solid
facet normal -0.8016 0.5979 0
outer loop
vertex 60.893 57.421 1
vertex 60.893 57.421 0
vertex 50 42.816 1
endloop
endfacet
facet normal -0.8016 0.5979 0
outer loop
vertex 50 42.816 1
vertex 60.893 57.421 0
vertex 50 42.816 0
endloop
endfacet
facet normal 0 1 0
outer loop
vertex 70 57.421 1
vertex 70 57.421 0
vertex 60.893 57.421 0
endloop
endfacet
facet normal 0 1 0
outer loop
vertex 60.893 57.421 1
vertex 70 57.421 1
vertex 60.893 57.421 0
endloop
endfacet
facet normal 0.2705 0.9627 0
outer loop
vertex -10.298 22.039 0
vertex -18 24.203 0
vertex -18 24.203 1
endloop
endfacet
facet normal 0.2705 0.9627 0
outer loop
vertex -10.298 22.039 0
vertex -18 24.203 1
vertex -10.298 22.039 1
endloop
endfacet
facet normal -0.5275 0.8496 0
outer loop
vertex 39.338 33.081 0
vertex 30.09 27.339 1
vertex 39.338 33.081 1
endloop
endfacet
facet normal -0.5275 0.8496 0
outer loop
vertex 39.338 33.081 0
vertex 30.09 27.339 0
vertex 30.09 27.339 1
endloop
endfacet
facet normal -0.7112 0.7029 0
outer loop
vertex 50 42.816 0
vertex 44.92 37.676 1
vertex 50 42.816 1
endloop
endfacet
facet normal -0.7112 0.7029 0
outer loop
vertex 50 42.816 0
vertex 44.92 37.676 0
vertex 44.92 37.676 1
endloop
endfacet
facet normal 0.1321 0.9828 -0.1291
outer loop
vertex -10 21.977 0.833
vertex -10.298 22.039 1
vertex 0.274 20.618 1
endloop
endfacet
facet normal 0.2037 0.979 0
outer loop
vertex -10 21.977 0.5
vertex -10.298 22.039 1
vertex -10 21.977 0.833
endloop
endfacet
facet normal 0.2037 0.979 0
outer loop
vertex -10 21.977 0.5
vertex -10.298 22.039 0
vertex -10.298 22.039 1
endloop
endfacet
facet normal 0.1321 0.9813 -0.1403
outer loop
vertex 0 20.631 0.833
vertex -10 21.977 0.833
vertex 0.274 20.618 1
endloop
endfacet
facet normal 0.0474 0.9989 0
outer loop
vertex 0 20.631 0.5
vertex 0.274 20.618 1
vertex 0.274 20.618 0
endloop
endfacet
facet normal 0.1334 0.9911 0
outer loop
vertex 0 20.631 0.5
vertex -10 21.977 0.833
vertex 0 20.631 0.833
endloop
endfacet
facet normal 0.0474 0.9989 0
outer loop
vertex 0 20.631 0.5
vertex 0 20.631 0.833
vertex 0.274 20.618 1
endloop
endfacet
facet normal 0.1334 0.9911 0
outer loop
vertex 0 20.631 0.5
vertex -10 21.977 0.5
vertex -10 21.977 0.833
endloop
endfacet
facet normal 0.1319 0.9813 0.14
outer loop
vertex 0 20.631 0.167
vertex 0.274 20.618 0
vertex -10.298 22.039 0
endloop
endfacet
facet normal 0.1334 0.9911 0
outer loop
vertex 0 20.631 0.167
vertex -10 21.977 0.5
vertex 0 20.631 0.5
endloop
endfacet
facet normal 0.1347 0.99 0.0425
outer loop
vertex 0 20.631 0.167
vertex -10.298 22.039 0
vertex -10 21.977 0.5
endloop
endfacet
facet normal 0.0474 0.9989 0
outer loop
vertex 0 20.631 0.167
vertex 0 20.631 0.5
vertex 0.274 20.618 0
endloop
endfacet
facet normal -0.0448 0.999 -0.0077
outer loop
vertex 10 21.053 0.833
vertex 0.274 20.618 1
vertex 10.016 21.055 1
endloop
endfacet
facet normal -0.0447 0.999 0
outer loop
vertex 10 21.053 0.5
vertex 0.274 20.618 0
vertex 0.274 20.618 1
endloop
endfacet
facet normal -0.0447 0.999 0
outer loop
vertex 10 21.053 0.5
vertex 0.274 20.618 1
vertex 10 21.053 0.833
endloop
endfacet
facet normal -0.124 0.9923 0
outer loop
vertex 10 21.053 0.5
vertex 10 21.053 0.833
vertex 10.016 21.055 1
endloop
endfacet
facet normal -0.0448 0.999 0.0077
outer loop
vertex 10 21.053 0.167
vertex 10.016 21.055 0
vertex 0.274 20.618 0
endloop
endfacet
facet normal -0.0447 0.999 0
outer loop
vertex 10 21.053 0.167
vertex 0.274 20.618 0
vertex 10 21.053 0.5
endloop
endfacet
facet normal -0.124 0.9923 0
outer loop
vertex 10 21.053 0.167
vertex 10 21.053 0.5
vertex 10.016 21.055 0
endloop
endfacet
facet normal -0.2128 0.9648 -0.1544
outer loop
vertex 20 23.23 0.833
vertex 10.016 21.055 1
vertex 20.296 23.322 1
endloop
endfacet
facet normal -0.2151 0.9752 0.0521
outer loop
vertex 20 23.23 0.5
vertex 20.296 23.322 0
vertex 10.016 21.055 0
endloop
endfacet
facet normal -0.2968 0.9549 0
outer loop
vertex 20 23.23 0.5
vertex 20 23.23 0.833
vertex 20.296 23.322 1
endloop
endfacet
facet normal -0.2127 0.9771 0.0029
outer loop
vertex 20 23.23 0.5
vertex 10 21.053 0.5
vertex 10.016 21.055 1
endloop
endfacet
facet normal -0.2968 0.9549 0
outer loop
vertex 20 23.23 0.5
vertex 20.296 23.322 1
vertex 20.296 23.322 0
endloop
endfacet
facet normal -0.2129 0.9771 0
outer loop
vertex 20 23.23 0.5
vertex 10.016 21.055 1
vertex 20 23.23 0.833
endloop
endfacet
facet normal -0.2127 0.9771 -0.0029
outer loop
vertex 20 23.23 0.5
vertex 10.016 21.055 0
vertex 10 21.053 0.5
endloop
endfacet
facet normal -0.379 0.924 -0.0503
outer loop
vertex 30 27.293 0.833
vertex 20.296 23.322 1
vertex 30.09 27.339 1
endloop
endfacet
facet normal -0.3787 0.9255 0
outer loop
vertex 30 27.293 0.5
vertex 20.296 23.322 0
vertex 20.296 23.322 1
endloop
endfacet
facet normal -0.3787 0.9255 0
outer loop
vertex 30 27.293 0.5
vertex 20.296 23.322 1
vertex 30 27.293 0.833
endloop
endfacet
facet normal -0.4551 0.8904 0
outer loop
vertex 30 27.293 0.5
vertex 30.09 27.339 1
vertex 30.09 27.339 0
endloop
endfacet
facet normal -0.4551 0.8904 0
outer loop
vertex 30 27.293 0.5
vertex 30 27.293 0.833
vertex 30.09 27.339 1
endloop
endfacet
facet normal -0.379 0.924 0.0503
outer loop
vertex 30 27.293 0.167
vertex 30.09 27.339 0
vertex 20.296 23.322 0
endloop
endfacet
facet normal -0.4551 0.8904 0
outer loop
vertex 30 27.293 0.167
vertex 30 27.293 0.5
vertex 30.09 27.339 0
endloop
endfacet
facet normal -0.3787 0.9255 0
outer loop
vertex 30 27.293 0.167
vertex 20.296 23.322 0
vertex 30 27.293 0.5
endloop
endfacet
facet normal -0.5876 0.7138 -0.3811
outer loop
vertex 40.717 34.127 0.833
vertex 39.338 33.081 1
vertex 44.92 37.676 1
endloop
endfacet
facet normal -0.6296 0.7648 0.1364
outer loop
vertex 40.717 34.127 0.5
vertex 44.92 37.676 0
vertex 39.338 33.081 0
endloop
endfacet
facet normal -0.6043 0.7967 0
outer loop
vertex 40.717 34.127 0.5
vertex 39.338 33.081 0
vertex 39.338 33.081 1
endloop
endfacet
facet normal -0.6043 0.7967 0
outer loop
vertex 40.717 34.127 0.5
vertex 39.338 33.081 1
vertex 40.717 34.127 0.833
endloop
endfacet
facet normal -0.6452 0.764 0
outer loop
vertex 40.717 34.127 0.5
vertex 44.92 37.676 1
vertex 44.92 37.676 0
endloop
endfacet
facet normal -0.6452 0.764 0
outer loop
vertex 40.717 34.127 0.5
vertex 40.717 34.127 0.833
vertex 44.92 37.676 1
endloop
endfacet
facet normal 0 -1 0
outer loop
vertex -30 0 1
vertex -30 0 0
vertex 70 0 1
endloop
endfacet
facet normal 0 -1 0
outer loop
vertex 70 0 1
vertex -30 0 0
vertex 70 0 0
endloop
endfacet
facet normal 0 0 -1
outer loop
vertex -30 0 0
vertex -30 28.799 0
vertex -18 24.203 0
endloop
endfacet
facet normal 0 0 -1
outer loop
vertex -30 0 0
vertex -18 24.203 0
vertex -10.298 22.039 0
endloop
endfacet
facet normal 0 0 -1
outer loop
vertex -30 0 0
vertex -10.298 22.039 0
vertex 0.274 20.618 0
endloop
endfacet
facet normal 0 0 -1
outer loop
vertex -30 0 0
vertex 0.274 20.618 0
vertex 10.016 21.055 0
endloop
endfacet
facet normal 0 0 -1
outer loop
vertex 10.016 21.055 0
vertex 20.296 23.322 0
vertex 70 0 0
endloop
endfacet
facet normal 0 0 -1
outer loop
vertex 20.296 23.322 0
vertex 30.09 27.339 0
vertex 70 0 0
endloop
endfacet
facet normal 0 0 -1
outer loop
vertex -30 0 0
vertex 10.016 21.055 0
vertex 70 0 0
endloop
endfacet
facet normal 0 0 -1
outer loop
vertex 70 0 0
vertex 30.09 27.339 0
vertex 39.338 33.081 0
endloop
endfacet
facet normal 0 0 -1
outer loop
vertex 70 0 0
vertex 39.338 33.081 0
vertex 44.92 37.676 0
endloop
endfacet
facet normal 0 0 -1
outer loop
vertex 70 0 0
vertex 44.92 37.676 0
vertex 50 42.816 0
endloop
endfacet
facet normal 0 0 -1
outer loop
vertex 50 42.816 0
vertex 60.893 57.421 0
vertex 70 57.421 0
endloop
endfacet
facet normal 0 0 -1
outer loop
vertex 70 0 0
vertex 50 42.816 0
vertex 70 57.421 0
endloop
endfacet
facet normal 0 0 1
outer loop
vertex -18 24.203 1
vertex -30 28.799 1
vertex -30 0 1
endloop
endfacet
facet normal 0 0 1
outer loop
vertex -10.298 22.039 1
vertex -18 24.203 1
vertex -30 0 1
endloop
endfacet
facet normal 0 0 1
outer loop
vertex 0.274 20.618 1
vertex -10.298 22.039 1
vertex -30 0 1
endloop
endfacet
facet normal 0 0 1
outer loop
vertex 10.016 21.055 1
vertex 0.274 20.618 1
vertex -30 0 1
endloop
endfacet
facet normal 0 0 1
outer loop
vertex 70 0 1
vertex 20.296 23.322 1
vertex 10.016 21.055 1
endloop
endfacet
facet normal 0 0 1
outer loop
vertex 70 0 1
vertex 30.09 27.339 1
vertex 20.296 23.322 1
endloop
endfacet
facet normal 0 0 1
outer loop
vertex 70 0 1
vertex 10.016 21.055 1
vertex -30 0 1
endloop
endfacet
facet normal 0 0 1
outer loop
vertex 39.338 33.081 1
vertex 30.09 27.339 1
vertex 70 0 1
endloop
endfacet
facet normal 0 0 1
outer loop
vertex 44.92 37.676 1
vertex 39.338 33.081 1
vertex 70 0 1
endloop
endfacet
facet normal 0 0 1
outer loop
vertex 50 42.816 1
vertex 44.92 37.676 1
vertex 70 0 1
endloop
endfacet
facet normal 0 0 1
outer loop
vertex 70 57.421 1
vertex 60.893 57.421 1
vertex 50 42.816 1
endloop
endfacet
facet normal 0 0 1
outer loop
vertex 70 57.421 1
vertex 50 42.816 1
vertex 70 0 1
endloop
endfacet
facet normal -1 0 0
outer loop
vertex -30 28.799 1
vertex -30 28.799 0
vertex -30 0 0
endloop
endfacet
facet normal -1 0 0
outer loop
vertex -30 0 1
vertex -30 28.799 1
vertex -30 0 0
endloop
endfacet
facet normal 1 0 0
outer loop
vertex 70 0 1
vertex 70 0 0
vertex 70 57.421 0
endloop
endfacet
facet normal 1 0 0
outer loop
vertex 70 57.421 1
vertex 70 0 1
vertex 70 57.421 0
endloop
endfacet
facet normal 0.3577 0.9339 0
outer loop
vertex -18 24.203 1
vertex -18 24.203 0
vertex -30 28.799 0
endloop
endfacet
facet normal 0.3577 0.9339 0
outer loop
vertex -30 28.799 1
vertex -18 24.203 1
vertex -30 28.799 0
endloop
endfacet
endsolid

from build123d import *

# Parameters (mm, degrees)
P_IDAT_VYSUNUT_M1_DEPTH = 1


with BuildPart() as part:
    # Skica1 → Přidat vysunutím1 (new body)
    with BuildSketch(Plane.XY):
        with BuildLine():
            Line((-18, 24.202745422), (-30, 28.799160271))
            Line((-30, 28.799160271), (-30, 0))
            Line((-30, 0), (70, 0))
            Line((70, 0), (70, 57.421257865))
            Line((70, 57.421257865), (60.893124688, 57.421257865))
            Line((60.893124688, 57.421257865), (50, 42.815530581))
            add(Edge.make_bspline(
                [(-18, 24.202745422), (-15.420987086, 23.214894317), (-9.439226577, 21.709441745), (-0.04984208, 20.304879655), (10.115235915, 20.781402631), (20.26700575, 22.994551549), (34.677773963, 28.876632867), (44.35056656, 36.49037351), (50, 42.815530581)],
                knots=[0, 0, 0, 0, 0.110930708, 0.245725485, 0.379434234, 0.516153574, 0.660347153, 1, 1, 1, 1], degree=3))
        make_face()
    extrude(amount=P_IDAT_VYSUNUT_M1_DEPTH)


solid = part.part
